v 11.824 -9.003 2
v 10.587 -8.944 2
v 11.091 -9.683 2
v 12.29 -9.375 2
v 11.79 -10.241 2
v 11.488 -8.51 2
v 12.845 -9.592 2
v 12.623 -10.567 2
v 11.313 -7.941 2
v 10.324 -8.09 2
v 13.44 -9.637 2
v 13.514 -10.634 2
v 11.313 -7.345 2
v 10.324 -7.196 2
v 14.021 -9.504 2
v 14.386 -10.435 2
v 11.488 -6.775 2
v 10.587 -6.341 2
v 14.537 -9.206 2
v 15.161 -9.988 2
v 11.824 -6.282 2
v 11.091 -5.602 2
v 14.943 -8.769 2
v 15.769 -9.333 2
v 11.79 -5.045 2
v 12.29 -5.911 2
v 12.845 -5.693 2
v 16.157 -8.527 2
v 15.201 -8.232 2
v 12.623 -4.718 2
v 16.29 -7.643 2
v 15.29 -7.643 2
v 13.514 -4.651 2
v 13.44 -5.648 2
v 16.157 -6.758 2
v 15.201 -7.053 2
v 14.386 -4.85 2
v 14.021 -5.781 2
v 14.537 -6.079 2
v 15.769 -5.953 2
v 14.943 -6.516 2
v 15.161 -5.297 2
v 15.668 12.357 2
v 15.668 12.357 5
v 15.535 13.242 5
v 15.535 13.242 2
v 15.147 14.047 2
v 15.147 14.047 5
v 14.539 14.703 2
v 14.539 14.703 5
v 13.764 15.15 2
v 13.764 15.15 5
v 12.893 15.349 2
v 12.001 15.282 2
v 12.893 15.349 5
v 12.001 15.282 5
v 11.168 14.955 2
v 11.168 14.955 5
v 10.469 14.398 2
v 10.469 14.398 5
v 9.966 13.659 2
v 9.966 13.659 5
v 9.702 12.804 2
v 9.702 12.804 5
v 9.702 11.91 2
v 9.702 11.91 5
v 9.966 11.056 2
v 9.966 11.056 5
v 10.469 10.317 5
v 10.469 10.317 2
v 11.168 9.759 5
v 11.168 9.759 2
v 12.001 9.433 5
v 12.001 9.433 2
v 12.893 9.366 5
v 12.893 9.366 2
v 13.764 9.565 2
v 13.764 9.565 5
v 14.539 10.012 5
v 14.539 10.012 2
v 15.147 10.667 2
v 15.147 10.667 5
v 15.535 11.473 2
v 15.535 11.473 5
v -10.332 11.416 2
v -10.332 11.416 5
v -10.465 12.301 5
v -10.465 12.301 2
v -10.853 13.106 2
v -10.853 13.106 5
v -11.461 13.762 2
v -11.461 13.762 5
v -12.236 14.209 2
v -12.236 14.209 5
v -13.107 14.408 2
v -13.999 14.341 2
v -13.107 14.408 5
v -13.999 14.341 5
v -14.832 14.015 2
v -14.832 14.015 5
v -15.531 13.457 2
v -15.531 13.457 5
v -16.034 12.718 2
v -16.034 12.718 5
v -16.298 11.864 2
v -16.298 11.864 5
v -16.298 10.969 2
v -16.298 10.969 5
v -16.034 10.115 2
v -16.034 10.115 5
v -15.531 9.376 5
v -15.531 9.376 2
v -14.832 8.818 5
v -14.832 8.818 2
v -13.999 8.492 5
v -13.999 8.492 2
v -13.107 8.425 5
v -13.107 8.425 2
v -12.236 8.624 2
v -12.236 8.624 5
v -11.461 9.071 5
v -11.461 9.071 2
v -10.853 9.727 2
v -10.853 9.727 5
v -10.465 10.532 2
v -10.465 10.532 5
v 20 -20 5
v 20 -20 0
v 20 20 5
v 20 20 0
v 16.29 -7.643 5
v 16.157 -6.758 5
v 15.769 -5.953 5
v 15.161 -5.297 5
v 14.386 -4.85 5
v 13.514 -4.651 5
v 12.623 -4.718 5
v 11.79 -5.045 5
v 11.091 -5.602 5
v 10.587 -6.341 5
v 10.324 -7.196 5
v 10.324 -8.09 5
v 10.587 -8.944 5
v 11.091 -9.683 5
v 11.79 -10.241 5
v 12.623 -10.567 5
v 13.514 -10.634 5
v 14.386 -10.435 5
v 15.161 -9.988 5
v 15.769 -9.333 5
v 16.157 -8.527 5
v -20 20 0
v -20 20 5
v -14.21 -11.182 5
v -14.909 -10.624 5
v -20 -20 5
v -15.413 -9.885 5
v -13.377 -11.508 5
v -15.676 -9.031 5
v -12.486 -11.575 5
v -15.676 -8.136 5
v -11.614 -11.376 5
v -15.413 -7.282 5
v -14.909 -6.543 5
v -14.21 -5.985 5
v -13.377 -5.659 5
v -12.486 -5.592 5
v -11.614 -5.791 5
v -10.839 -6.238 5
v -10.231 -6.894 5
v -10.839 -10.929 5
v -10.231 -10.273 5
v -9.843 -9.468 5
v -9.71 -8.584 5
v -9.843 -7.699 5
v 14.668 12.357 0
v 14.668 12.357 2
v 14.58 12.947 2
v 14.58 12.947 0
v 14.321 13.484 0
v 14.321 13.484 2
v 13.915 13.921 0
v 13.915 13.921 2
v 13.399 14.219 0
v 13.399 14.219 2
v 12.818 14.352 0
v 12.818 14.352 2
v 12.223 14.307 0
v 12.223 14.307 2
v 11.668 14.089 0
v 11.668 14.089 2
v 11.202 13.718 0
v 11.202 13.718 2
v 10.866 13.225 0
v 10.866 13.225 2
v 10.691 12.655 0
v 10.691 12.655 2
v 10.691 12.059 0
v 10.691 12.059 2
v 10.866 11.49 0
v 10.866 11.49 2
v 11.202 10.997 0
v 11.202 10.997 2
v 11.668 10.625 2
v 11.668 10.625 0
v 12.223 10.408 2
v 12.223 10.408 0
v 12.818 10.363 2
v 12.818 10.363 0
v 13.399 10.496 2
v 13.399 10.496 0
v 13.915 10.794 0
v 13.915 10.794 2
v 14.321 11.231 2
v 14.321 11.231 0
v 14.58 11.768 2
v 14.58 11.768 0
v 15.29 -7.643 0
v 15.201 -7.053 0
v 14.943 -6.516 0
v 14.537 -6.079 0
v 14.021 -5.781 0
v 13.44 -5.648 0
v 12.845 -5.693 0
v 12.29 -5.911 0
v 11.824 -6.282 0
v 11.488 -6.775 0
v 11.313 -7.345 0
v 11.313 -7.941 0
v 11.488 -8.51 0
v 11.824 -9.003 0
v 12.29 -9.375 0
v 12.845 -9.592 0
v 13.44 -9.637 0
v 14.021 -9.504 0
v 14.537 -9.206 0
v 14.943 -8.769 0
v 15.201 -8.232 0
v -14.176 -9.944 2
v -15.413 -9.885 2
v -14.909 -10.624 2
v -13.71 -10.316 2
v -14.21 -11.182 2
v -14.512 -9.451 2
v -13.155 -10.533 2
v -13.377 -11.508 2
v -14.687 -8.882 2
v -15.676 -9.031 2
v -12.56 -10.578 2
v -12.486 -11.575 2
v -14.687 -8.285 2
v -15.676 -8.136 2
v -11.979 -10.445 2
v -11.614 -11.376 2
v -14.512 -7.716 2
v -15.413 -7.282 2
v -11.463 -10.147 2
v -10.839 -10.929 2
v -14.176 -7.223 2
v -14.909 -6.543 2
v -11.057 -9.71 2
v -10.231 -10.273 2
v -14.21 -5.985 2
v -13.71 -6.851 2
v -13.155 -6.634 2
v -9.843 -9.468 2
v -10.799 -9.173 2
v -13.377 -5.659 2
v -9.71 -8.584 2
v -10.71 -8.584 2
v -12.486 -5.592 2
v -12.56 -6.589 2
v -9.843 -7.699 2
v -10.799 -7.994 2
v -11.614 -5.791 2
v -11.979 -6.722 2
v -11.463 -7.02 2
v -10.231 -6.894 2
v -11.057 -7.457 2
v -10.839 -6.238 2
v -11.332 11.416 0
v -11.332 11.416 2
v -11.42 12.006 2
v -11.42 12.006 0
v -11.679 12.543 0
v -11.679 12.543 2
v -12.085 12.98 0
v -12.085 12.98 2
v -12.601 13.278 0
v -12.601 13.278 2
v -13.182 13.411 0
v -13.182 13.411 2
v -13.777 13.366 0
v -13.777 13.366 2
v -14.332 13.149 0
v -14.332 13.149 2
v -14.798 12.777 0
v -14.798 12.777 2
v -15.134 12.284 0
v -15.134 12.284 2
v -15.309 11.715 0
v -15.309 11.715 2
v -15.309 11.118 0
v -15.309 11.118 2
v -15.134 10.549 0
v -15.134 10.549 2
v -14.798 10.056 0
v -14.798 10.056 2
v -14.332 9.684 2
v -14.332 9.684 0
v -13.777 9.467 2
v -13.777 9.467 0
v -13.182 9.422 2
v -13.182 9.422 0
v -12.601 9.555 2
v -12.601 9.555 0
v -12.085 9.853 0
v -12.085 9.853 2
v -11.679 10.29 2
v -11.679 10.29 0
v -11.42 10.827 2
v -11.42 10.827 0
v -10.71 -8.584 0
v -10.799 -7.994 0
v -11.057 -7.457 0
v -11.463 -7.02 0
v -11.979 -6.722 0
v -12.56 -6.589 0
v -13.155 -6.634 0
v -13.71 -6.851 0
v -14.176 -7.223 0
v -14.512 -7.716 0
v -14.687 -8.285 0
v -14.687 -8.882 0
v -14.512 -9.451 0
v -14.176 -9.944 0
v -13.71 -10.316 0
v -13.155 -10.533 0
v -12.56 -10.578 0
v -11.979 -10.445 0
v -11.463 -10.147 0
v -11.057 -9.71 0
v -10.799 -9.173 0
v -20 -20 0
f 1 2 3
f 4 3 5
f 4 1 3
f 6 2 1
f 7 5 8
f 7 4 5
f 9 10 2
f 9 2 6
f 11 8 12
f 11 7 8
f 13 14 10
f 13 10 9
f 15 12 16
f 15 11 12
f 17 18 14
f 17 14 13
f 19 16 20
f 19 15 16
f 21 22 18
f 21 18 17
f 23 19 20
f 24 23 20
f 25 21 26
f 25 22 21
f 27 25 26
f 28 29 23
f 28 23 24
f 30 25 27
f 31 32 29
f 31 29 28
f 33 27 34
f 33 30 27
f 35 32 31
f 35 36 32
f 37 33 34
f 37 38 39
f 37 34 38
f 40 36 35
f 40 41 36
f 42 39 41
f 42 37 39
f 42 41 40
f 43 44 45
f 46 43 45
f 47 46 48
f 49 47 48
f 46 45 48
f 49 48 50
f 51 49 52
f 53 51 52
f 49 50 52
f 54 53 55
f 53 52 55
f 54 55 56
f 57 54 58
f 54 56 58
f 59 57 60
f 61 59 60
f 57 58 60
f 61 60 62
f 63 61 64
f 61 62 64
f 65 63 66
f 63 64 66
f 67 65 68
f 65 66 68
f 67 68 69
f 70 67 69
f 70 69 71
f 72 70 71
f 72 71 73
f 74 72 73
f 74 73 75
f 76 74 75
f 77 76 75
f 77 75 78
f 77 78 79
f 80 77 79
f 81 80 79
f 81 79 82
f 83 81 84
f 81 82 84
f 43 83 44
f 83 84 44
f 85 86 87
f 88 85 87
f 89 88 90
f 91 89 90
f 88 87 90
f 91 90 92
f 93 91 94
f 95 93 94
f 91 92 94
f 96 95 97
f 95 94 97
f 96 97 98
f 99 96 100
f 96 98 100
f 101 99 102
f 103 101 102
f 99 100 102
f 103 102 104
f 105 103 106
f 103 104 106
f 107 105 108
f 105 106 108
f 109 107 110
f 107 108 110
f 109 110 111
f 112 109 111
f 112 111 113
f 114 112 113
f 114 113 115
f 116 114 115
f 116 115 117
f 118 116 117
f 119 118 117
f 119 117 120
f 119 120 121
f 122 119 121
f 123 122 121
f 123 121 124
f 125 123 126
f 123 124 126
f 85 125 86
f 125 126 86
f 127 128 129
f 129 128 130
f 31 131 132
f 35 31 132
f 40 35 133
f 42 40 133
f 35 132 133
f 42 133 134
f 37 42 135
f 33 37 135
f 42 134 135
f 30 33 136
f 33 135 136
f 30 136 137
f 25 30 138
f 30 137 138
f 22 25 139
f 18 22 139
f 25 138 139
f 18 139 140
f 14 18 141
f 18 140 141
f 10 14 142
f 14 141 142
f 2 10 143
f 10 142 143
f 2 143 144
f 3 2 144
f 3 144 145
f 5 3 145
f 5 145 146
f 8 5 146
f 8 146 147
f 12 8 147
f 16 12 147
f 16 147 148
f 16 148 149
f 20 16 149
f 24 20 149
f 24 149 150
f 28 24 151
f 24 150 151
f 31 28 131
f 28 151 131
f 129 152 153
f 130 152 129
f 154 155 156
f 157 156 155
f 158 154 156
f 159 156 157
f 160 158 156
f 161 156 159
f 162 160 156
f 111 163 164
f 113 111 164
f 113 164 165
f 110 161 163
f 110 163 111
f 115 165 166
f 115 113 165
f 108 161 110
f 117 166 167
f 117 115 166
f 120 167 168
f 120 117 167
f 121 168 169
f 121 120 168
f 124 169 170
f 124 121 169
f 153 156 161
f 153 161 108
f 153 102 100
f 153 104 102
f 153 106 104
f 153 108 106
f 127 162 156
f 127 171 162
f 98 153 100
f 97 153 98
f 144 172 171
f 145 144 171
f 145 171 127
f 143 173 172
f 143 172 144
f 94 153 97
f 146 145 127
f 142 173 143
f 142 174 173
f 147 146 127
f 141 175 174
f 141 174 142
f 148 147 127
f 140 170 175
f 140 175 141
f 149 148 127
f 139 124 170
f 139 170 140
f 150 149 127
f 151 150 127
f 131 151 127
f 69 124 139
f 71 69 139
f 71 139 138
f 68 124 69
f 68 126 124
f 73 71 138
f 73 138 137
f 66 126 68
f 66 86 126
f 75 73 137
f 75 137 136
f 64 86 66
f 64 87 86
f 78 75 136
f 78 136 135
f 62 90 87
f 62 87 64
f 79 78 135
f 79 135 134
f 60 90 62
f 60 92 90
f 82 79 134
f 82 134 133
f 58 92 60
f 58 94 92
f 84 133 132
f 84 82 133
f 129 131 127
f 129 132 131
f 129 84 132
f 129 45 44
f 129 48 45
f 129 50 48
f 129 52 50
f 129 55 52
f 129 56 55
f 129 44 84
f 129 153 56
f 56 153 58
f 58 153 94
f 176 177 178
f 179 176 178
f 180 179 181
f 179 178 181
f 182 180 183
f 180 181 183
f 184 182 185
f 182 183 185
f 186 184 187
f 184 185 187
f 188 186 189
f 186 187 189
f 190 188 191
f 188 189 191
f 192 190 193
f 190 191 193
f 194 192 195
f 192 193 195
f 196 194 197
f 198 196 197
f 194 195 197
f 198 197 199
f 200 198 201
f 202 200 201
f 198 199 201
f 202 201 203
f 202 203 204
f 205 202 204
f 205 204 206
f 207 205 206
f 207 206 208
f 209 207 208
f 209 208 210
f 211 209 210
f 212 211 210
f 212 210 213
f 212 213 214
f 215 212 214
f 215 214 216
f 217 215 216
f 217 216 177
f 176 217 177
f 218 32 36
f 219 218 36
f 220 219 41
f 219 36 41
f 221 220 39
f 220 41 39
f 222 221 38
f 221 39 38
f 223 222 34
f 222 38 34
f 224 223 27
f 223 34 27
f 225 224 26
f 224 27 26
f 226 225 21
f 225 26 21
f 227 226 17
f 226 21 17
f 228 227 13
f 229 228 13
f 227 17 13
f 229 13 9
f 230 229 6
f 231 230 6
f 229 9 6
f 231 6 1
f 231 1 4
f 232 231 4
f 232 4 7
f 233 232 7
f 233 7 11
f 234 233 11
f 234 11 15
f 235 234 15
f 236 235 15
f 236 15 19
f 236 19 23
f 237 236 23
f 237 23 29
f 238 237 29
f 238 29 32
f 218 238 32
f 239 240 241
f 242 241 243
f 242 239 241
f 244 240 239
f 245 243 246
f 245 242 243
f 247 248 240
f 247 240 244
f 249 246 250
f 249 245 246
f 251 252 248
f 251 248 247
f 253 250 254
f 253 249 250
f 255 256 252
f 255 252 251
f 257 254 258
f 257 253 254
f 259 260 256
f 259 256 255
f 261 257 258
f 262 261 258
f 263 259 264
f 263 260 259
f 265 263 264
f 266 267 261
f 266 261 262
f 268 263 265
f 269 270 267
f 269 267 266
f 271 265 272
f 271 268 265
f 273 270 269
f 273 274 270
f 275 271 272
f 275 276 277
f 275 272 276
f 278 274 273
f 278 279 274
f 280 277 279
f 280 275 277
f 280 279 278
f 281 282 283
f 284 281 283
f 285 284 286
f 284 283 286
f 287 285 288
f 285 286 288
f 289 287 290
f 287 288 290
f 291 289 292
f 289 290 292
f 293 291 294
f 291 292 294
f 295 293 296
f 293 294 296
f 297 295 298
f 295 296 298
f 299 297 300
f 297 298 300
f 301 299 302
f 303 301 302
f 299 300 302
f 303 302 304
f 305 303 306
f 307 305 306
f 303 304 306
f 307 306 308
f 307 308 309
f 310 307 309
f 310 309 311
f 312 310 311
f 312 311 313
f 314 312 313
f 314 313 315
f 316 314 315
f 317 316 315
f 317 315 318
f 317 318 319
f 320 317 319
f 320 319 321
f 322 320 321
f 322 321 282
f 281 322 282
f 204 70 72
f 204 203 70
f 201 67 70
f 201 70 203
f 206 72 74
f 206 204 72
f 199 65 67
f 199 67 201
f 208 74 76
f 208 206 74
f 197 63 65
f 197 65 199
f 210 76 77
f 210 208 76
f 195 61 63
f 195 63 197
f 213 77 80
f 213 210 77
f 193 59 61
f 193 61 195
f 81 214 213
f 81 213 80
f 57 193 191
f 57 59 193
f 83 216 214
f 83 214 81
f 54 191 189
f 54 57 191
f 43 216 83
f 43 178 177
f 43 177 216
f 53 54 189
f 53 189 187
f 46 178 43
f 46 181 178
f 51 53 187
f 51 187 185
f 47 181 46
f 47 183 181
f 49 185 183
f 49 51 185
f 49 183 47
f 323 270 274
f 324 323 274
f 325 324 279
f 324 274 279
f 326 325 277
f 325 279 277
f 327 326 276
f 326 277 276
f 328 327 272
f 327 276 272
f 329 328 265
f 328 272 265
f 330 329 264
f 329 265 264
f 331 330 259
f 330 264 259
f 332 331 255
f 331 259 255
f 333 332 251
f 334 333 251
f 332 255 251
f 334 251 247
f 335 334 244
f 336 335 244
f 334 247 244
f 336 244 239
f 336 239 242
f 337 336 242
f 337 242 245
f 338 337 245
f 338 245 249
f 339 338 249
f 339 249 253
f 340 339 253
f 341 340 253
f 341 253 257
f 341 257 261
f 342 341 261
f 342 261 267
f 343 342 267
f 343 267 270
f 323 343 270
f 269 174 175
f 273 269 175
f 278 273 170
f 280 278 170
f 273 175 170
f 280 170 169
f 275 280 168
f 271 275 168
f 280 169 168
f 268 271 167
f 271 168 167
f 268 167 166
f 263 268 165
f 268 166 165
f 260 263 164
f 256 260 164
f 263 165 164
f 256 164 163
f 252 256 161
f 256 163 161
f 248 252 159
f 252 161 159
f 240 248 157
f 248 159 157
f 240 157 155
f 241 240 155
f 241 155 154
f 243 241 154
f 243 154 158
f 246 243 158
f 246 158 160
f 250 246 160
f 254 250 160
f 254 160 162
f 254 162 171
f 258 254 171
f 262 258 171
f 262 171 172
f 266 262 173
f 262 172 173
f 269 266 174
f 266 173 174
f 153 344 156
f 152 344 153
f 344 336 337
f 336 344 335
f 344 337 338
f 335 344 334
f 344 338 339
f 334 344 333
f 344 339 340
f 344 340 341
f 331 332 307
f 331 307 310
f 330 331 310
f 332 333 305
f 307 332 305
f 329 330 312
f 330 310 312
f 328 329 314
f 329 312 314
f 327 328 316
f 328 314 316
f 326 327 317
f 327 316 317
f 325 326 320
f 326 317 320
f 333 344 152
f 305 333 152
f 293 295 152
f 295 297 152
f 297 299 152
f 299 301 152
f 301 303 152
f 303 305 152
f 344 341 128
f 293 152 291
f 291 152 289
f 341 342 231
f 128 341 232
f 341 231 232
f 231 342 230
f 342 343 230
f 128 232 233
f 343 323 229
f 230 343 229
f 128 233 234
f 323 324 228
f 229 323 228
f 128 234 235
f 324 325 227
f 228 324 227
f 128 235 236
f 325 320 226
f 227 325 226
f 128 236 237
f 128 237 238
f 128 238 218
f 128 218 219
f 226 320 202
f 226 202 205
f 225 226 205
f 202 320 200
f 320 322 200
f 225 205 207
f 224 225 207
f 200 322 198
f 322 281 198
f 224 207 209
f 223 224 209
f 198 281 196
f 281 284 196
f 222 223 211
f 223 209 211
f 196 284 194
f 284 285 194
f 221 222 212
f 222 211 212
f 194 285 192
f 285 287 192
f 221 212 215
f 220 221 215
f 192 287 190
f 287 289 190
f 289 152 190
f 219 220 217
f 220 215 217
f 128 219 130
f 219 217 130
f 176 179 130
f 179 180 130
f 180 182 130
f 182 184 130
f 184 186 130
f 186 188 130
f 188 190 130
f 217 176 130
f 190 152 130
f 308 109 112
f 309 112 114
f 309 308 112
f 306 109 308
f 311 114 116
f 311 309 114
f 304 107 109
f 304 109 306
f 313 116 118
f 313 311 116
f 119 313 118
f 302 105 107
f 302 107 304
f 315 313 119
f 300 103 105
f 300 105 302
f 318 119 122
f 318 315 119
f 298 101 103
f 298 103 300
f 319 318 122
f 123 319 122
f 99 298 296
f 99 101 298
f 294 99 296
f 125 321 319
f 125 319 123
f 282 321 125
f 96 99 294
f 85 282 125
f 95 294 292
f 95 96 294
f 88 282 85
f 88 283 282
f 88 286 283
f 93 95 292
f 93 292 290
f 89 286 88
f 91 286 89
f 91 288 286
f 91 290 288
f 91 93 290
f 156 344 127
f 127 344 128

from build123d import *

# Parameters (mm, degrees)
F0_W     = 40
F0_H     = 40
F1_DEPTH = 5
F2_R     = 2
F3_DEPTH = 5
F4_R     = 3
F5_DEPTH = 3


with BuildPart() as f1:
    # F0 (on Top) → F1 (new body)
    with BuildSketch(Plane.XY):
        Rectangle(F0_W, F0_H)
    extrude(amount=F1_DEPTH)

    # F2 (on face) → F3 (cut)
    with BuildSketch(Plane.XY.offset(5)):
        with Locations((-12.70971, -8.583505)):
            Circle(F2_R)
        with Locations((-13.331592, 11.416495)):
            Circle(F2_R)
        with Locations((12.668408, 12.357356)):
            Circle(F2_R)
        with Locations((13.29029, -7.642644)):
            Circle(F2_R)
    extrude(amount=-F3_DEPTH, mode=Mode.SUBTRACT)

    # F4 (on face) → F5 (cut)
    with BuildSketch(Plane.XY.offset(5)):
        with Locations((-12.70971, -8.583505)):
            Circle(F4_R)
        with Locations((-13.331592, 11.416495)):
            Circle(F4_R)
        with Locations((12.668408, 12.357356)):
            Circle(F4_R)
        with Locations((13.29029, -7.642644)):
            Circle(F4_R)
    extrude(amount=-F5_DEPTH, mode=Mode.SUBTRACT)


solid = f1.part
